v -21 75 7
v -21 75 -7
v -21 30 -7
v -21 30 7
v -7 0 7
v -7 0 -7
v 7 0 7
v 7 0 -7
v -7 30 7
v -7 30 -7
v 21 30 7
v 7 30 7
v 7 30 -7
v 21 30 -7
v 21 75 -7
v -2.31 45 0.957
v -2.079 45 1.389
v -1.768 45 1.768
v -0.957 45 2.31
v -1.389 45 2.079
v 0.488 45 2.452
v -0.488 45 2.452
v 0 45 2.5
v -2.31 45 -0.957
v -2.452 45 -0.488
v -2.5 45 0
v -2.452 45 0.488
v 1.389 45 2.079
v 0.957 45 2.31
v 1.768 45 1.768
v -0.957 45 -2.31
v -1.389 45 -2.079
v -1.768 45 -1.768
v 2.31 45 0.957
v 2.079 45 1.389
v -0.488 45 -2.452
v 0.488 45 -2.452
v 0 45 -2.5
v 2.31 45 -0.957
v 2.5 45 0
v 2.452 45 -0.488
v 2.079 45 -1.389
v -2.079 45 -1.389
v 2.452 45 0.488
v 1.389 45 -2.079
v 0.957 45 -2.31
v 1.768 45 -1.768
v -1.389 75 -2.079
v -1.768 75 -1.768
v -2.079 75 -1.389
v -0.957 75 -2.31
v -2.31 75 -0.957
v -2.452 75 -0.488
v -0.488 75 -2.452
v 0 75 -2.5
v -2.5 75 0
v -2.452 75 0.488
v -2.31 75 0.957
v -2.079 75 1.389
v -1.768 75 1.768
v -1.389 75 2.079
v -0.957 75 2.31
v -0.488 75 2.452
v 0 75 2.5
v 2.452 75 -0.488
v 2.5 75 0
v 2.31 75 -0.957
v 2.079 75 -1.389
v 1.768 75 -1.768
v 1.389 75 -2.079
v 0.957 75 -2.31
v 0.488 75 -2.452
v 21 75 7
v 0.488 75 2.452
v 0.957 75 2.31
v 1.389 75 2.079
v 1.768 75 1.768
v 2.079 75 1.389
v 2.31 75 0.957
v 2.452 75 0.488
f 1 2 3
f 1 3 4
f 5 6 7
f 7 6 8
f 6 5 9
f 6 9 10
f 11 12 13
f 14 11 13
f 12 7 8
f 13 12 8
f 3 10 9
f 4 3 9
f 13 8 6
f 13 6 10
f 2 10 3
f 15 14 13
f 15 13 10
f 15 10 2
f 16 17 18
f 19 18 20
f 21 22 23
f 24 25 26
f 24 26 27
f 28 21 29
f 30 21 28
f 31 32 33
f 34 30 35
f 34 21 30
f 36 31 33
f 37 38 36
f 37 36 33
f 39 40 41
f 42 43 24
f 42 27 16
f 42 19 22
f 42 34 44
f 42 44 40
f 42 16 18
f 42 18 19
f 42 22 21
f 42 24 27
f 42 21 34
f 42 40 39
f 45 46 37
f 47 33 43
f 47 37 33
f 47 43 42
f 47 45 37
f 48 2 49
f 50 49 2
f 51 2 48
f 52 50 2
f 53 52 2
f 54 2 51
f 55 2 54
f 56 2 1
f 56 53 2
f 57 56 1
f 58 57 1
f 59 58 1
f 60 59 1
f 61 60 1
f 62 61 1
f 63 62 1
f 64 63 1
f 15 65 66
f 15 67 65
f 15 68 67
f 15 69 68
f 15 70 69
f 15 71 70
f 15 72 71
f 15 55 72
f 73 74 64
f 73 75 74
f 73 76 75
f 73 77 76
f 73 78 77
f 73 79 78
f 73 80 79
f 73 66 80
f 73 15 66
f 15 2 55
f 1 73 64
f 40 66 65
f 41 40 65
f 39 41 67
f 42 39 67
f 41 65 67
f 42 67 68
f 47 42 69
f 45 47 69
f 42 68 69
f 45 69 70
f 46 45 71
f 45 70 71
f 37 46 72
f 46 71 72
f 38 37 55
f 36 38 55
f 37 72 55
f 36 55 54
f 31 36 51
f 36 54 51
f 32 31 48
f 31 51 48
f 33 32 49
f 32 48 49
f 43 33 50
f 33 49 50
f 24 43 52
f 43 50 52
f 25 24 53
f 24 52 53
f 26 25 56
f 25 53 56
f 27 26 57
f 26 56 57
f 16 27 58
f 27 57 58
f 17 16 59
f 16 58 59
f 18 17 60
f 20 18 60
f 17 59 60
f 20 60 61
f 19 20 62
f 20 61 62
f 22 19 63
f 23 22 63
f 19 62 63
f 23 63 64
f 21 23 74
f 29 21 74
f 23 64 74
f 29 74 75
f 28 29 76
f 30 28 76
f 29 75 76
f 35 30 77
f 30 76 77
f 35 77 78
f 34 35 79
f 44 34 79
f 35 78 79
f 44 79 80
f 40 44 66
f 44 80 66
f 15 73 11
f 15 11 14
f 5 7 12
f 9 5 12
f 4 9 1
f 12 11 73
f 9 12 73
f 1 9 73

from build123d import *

# Parameters (mm, degrees)
SKETCH1_W           = 14
SKETCH1_H           = 14
BOSS_EXTRUDE1_DEPTH = 75
SKETCH2_R           = 2.5
CUT_EXTRUDE1_DEPTH  = 30
SKETCH3_W           = 14
SKETCH3_H           = 45
BOSS_EXTRUDE2_DEPTH = 14
SKETCH4_W           = 14
SKETCH4_H           = 45
BOSS_EXTRUDE3_DEPTH = 14


with BuildPart() as part:
    # Sketch1 → Boss-Extrude1 (new body)
    with BuildSketch(Plane(origin=(0, 0, 0), x_dir=(1, 0, 0), z_dir=(0, 1, 0))):
        Rectangle(SKETCH1_W, SKETCH1_H)
    extrude(amount=BOSS_EXTRUDE1_DEPTH)

    # Sketch2 → Cut-Extrude1 (cut)
    with BuildSketch(Plane(origin=(0, 75, 0), x_dir=(1, 0, 0), z_dir=(0, 1, 0))):
        Circle(SKETCH2_R)
    extrude(amount=-CUT_EXTRUDE1_DEPTH, mode=Mode.SUBTRACT)

    # Sketch3 → Boss-Extrude2 (add)
    with BuildSketch(Plane(origin=(7, 0, 0), x_dir=(0, 0, -1), z_dir=(1, 0, 0))):
        with Locations((0, 52.5)):
            Rectangle(SKETCH3_W, SKETCH3_H)
    extrude(amount=BOSS_EXTRUDE2_DEPTH)

    # Sketch4 → Boss-Extrude3 (add)
    with BuildSketch(Plane.ZY.offset(7)):
        with Locations((0, 52.5)):
            Rectangle(SKETCH4_W, SKETCH4_H)
    extrude(amount=BOSS_EXTRUDE3_DEPTH)


solid = part.part
